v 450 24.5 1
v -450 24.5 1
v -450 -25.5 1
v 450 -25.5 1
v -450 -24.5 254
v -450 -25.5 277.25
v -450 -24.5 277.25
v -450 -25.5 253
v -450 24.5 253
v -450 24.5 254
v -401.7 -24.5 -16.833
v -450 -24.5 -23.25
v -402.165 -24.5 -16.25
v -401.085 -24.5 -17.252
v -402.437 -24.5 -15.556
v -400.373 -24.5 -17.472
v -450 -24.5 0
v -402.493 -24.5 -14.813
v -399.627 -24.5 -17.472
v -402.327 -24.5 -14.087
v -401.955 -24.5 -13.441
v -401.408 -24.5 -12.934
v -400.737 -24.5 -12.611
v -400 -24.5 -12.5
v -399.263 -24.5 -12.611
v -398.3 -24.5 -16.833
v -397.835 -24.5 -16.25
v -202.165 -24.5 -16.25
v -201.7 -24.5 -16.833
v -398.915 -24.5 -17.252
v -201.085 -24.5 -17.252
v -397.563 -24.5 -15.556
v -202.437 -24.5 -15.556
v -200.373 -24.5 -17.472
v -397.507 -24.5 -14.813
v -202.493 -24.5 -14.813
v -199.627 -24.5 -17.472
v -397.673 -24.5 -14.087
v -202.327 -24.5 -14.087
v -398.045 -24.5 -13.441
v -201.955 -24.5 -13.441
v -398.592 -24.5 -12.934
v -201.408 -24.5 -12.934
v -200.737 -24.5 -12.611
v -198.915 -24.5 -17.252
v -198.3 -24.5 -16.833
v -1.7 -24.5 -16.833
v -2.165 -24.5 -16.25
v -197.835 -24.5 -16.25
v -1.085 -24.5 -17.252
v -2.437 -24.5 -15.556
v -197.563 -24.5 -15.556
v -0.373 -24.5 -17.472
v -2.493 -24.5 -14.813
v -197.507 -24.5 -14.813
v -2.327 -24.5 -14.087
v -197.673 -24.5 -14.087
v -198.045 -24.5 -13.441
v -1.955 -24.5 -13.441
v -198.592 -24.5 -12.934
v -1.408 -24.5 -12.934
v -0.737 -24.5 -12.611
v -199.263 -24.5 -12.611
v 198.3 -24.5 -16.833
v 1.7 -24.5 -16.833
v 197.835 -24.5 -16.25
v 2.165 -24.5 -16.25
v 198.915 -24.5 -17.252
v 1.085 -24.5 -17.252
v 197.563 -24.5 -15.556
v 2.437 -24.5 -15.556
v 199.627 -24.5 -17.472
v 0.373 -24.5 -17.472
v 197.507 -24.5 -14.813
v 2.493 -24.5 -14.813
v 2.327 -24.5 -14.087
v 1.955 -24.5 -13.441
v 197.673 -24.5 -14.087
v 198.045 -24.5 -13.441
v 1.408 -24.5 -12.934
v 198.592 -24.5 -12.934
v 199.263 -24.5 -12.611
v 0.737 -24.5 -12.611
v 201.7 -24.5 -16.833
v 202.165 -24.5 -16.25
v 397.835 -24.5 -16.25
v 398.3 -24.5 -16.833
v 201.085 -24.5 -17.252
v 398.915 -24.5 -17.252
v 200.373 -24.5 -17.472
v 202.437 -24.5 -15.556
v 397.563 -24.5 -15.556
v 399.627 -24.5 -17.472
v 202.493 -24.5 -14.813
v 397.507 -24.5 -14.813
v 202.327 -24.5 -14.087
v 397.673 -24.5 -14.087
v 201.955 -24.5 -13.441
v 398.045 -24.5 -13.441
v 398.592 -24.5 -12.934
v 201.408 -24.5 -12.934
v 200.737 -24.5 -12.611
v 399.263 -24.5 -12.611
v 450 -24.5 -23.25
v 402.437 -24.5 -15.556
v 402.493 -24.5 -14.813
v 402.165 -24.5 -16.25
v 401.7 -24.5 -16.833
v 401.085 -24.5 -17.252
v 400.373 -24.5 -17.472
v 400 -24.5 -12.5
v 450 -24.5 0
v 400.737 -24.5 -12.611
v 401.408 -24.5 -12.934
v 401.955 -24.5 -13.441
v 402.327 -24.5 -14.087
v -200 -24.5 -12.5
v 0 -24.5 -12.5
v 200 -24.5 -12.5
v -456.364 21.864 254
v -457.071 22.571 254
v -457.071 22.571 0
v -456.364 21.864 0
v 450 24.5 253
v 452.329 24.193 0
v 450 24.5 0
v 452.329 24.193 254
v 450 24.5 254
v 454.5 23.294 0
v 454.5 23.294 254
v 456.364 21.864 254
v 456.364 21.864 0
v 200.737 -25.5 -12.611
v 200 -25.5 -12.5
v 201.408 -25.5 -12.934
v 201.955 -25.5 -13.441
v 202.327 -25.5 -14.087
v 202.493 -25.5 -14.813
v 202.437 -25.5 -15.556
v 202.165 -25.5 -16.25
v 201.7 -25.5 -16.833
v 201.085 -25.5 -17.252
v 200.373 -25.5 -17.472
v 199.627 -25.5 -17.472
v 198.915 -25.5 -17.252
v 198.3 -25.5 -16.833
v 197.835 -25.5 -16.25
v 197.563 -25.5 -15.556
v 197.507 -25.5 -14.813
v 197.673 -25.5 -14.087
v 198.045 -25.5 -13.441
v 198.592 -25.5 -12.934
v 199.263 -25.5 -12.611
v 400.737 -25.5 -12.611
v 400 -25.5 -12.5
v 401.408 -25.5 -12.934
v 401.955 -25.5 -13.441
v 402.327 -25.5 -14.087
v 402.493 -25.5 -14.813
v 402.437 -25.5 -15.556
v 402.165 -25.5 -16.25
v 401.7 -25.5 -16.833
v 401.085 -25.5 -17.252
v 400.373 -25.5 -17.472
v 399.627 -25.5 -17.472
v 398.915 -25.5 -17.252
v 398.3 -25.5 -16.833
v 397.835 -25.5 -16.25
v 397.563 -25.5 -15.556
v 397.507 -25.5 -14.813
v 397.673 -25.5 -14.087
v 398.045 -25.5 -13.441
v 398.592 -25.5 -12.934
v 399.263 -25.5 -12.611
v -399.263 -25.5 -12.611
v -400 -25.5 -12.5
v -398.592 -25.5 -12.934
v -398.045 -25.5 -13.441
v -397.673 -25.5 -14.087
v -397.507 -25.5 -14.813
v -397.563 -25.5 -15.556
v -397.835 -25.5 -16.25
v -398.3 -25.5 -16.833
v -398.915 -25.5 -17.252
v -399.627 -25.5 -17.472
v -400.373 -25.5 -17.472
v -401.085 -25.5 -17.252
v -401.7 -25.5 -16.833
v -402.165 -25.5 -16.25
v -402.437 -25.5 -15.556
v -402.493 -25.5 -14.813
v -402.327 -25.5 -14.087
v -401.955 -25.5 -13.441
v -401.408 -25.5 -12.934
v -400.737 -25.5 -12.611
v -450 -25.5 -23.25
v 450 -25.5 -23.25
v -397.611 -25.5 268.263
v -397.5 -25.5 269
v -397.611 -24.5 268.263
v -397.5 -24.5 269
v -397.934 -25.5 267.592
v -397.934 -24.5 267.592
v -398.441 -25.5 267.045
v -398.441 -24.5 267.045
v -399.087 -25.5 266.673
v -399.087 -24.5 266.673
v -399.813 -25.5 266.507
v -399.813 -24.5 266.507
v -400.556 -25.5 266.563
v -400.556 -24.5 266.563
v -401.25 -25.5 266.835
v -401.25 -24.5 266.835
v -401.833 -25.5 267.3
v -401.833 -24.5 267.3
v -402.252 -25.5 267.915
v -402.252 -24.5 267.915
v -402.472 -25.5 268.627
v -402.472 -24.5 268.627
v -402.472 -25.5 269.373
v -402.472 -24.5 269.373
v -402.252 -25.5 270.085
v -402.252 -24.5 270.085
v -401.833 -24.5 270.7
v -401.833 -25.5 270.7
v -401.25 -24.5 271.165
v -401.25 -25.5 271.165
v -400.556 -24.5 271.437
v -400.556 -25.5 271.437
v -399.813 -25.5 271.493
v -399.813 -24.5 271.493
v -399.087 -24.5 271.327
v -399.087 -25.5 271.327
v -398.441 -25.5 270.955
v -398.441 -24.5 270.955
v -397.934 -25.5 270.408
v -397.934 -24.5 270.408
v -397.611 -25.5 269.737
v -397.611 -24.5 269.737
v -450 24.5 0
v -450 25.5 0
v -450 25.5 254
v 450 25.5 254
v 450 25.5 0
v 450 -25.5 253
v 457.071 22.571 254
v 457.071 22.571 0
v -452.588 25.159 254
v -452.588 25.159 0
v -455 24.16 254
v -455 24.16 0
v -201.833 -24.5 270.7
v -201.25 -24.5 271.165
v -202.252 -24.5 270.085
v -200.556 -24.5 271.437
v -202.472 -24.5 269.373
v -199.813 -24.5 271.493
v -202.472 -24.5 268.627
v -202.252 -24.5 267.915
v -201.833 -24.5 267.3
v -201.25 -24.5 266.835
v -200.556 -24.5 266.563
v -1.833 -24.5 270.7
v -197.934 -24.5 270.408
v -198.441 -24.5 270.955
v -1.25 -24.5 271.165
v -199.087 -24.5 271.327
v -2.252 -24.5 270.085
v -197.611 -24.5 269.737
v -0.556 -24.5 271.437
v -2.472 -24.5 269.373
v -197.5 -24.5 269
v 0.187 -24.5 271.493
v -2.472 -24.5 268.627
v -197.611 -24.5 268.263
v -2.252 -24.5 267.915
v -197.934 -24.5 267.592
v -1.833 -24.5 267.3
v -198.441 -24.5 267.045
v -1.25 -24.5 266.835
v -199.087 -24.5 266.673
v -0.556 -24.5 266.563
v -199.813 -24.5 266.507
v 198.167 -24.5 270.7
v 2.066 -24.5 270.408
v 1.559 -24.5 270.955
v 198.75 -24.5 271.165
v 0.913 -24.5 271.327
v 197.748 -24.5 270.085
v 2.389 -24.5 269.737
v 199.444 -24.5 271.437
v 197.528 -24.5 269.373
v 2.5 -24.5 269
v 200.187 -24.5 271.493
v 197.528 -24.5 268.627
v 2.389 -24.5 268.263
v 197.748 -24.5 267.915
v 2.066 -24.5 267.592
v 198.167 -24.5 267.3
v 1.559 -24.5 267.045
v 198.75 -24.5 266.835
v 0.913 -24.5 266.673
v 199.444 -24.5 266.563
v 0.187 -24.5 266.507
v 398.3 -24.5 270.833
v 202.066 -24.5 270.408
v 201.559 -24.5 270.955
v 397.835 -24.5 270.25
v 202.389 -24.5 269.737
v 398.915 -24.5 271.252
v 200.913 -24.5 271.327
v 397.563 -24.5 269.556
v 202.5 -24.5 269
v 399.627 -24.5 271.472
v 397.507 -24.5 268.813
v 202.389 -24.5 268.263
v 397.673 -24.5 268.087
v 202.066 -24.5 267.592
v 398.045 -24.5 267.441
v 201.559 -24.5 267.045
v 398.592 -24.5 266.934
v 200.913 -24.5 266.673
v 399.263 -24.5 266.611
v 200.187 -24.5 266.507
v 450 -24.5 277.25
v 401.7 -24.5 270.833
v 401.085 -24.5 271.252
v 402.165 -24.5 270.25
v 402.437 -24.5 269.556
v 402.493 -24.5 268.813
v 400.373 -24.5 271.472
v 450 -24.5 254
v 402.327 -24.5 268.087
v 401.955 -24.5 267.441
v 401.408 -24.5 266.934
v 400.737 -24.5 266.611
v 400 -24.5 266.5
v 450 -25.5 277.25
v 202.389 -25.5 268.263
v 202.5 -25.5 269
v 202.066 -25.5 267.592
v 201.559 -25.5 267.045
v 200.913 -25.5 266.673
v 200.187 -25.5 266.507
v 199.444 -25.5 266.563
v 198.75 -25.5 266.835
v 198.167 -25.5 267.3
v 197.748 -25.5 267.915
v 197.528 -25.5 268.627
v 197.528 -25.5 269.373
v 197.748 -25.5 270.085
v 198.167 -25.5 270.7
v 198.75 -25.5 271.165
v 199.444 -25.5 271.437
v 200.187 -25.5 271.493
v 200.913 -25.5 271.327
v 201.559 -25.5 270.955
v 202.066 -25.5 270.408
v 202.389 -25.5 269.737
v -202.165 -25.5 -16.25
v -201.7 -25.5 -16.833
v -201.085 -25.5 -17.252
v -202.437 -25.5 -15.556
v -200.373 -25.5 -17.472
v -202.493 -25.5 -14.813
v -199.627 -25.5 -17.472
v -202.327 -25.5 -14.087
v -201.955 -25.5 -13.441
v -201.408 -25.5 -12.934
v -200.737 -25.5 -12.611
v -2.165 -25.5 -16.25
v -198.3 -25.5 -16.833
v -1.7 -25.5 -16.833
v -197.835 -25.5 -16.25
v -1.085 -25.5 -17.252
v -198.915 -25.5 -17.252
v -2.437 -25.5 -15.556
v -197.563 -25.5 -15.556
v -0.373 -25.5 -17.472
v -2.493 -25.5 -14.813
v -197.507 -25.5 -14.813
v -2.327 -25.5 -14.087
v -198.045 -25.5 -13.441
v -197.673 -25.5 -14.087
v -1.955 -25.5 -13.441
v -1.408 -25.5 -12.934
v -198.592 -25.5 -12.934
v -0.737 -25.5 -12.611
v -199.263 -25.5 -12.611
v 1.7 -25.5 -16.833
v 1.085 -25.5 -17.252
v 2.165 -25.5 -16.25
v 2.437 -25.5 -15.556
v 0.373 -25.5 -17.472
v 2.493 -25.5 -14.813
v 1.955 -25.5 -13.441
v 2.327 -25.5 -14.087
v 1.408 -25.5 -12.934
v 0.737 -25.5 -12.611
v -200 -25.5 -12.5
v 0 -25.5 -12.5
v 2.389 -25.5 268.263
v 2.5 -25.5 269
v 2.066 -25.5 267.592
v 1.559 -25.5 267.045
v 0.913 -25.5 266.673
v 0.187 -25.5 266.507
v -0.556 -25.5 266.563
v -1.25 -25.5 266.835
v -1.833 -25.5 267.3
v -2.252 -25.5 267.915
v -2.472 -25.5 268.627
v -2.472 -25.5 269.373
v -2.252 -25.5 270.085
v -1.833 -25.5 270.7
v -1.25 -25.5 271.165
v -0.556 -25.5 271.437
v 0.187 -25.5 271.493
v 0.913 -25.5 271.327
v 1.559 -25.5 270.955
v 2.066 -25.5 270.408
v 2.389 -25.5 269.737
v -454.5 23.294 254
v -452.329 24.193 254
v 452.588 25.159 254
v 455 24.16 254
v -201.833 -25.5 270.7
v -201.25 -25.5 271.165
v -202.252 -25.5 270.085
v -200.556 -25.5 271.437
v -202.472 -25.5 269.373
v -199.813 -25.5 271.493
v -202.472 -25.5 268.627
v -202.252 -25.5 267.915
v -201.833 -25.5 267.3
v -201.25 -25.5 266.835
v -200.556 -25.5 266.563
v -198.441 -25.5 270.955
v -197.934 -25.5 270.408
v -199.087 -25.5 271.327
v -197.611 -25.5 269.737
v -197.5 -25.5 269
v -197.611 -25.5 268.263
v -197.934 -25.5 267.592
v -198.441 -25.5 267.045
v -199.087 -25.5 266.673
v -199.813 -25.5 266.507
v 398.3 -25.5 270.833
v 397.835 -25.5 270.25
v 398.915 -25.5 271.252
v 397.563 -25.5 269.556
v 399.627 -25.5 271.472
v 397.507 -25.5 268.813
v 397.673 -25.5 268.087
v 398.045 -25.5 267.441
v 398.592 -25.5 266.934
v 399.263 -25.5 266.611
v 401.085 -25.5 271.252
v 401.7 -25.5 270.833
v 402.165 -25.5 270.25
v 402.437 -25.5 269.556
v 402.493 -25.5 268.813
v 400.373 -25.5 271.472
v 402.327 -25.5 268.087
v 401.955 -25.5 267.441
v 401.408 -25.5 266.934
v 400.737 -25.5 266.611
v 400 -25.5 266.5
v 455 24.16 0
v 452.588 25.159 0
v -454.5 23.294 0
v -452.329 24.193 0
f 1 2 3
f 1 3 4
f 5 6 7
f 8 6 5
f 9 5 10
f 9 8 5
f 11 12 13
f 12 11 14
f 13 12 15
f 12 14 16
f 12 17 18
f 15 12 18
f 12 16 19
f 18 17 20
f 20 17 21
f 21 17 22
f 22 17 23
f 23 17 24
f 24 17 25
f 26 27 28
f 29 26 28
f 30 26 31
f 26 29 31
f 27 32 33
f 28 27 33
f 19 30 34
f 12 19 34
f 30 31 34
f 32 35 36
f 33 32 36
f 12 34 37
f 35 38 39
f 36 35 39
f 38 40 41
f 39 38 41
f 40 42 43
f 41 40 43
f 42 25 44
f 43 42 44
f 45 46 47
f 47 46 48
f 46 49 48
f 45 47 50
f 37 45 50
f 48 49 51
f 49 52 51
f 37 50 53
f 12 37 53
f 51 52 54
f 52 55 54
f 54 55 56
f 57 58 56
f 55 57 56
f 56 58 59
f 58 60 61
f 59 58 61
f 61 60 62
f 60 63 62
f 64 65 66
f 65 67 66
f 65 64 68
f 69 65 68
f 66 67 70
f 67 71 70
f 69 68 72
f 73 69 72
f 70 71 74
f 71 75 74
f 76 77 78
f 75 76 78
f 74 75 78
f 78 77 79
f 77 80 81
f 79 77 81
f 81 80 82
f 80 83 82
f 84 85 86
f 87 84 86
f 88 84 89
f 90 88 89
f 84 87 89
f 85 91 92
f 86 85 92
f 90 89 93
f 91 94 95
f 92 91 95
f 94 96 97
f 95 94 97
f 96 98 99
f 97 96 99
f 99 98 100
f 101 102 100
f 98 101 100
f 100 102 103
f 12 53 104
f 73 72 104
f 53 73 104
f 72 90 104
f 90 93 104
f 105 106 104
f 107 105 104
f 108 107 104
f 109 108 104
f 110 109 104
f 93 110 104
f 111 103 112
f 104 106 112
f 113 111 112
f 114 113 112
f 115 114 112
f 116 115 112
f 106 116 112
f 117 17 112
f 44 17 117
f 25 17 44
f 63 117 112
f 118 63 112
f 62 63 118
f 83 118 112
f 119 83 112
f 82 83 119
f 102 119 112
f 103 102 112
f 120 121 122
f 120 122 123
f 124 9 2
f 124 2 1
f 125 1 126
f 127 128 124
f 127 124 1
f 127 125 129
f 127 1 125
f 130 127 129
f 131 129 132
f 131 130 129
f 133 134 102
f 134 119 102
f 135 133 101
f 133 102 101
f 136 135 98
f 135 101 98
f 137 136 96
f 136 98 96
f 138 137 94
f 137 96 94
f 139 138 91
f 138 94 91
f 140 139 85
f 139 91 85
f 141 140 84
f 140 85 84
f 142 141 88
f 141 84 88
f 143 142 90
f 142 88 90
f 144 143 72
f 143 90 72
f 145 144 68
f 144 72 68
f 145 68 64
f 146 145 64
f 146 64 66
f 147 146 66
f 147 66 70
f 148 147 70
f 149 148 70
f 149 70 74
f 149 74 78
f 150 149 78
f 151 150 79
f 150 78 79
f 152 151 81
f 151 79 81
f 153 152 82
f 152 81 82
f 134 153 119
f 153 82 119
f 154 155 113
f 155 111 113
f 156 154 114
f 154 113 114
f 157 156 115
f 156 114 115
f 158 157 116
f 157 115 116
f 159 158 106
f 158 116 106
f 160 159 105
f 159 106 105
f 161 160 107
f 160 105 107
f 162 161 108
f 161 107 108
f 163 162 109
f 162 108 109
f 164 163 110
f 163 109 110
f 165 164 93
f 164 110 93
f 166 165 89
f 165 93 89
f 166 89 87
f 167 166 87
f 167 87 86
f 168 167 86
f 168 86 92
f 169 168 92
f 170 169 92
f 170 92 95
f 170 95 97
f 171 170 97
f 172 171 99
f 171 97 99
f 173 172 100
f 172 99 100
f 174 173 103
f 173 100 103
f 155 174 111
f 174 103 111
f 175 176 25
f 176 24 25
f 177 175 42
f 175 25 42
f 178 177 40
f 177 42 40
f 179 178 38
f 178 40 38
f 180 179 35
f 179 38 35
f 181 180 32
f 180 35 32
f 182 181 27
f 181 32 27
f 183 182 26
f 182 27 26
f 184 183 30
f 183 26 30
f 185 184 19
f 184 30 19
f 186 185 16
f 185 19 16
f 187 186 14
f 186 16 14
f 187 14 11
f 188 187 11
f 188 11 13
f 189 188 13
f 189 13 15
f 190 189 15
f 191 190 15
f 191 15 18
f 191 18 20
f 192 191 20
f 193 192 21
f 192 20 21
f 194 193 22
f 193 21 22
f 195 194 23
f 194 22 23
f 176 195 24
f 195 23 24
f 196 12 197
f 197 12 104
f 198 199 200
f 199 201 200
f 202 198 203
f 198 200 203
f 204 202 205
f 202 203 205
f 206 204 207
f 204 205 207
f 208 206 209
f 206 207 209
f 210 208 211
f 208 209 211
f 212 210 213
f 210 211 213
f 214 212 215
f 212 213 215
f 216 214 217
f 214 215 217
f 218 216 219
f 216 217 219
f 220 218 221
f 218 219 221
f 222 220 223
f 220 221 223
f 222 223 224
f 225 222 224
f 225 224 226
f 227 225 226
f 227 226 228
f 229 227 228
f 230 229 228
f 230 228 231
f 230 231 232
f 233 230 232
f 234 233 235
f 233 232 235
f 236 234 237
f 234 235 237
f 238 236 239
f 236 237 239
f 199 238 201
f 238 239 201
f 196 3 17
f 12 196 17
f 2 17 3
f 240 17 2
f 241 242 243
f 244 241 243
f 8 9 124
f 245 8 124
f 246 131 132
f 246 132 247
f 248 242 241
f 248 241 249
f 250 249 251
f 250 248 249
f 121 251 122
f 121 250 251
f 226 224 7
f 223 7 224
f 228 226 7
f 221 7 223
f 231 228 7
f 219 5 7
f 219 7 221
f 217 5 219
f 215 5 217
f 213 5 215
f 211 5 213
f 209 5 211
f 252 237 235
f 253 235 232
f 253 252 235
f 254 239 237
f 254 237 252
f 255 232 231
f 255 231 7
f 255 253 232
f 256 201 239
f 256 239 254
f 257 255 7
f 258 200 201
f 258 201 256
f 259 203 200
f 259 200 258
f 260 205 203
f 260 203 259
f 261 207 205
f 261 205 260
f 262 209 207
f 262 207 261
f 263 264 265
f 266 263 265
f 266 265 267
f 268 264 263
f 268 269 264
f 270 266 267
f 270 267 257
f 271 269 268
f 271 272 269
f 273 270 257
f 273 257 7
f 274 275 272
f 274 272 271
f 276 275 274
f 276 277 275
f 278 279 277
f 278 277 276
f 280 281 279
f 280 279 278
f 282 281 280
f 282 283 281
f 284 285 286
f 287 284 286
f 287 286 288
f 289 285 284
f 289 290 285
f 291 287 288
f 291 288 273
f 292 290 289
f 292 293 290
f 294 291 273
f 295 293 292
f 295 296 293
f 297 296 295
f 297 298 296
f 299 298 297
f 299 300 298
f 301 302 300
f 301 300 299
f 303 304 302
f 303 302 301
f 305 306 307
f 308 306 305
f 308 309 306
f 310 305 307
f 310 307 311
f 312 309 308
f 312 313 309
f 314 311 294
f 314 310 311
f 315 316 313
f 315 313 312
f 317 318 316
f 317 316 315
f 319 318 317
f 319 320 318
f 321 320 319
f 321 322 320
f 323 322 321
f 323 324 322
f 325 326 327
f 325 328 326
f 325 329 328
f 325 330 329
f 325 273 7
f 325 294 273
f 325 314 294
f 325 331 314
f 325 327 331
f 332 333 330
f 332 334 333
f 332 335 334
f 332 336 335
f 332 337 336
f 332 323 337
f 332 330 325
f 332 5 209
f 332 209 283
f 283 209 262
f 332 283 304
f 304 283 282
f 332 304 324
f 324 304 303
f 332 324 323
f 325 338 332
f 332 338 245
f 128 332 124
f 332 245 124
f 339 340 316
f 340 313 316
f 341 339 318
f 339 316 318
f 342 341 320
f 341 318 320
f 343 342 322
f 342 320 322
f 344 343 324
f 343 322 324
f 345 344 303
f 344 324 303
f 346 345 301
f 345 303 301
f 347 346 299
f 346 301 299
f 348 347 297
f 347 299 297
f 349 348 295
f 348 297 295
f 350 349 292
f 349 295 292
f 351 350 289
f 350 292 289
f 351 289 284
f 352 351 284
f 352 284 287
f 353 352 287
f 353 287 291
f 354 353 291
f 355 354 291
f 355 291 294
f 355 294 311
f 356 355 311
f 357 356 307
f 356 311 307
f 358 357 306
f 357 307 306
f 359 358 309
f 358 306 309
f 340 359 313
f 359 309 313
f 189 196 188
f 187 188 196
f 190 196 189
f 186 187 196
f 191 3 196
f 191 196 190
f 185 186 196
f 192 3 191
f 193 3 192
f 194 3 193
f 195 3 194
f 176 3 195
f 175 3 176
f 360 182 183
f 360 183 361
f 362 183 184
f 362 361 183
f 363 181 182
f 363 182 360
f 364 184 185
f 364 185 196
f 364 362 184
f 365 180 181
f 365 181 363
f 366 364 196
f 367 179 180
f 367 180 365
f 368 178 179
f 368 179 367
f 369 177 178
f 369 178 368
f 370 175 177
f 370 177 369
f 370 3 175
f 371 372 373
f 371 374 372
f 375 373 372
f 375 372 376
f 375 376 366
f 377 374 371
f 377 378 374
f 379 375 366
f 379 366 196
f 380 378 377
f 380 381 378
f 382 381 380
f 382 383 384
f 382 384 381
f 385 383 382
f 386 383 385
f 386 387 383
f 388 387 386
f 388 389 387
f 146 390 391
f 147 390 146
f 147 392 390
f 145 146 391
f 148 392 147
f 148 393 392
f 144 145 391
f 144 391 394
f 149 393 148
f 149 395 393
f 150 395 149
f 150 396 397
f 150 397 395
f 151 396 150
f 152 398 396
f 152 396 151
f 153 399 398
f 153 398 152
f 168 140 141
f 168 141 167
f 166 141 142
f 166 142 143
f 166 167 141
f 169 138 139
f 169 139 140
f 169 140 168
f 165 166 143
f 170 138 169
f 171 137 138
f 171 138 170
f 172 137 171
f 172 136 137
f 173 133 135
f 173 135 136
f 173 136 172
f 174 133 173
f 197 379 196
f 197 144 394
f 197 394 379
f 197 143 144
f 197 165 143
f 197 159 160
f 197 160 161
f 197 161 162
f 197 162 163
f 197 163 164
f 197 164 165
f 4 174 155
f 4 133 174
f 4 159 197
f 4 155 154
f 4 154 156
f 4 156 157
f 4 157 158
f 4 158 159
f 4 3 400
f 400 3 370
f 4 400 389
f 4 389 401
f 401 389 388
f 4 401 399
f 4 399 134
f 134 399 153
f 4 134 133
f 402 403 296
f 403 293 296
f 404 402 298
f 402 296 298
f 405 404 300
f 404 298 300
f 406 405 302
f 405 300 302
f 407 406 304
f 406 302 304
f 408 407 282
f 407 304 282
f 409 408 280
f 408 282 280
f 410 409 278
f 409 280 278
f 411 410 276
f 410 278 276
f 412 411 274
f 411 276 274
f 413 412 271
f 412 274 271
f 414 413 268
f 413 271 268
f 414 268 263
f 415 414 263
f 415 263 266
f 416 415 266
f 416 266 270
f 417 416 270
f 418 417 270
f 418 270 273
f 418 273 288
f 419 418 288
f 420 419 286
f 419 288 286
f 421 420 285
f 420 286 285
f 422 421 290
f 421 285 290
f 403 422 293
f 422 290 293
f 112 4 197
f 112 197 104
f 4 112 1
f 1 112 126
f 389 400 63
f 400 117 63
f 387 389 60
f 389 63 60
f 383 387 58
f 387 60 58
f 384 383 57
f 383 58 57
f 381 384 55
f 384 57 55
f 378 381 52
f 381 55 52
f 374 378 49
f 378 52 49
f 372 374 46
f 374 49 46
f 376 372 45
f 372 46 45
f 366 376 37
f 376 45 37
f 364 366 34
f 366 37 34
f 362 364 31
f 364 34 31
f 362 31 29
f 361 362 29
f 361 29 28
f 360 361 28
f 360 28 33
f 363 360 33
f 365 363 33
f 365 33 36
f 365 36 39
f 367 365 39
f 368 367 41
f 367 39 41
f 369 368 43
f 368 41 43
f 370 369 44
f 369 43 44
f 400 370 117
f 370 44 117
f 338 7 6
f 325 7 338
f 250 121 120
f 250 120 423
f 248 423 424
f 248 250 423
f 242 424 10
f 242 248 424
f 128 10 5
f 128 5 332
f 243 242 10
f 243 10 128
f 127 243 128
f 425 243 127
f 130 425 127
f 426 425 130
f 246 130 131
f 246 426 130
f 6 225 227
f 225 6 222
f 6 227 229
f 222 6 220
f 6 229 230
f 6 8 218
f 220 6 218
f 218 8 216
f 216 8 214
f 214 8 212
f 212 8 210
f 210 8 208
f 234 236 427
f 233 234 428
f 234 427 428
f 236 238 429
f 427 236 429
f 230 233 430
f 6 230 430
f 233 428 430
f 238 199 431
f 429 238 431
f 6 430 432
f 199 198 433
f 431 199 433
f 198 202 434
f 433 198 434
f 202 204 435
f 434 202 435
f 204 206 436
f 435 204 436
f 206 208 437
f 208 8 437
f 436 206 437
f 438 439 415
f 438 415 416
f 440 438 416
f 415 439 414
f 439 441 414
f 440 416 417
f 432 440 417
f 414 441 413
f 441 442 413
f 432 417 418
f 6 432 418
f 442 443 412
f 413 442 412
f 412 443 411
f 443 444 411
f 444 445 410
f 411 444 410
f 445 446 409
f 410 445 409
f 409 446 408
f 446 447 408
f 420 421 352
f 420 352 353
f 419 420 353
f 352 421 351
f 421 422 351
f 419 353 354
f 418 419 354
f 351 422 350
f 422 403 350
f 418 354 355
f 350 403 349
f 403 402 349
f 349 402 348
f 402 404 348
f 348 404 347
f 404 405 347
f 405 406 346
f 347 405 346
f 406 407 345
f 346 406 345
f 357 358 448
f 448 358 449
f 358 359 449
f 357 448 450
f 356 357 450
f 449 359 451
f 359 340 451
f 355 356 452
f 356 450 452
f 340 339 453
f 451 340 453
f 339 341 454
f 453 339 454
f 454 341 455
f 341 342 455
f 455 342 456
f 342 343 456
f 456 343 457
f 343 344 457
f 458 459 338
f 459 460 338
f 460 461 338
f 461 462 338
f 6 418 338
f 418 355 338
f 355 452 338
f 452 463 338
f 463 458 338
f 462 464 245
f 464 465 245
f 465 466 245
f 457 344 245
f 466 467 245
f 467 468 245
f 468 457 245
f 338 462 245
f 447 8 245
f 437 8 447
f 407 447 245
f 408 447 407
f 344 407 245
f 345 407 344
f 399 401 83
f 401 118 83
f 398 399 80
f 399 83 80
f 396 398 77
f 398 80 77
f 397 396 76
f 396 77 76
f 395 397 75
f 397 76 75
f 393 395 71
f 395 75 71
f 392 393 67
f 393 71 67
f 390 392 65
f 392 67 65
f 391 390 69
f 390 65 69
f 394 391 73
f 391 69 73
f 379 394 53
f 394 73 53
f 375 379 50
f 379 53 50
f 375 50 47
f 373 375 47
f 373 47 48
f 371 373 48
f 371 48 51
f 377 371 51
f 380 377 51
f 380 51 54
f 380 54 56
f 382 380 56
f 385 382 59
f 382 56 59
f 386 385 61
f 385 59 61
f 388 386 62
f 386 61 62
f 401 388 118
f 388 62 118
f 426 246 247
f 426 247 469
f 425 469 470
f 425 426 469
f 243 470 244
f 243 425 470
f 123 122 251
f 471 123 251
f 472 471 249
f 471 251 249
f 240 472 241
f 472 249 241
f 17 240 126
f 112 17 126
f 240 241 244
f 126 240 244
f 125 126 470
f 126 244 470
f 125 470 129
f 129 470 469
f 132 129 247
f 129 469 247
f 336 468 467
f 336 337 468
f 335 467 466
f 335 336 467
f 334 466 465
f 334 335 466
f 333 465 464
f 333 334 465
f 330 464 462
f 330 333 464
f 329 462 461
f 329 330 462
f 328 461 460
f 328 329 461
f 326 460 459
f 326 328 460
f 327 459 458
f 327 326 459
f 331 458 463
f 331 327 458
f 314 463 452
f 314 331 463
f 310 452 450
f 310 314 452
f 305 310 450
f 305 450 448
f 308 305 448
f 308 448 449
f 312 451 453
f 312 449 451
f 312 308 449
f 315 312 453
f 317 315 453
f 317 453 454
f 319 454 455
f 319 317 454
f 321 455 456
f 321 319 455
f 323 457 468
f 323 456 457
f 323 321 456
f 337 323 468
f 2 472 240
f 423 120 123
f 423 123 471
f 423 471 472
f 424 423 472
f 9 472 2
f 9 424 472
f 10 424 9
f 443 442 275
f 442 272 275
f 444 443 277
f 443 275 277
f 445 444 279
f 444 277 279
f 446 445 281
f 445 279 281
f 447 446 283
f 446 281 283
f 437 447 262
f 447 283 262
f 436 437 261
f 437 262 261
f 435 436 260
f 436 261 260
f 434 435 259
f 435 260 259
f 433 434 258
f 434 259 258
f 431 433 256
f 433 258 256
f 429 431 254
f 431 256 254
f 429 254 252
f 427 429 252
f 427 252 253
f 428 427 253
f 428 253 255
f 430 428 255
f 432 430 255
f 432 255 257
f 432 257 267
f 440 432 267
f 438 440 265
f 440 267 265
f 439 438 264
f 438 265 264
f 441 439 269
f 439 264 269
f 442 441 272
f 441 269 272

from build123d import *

# Parameters (mm, degrees)
SKETCH2_W               = 900
SKETCH2_H               = 51
BOSS_EXTRUDE1_DEPTH     = 1
SKETCH3_W               = 900
SKETCH3_H               = 1
BOSS_EXTRUDE2_DEPTH     = 23.25
BOSS_EXTRUDE3_START     = 1
SKETCH4_W               = 900
SKETCH4_H               = 1
BOSS_EXTRUDE3_DEPTH     = 126
SKETCH5_R               = 2.5
CUT_EXTRUDE1_DEPTH      = 469.272623586
LPATTERN2_COUNT         = 6
LPATTERN2_PITCH         = 200
BOSS_EXTRUDE4_DEPTH     = 127
BOSS_EXTRUDE5_DEPTH     = 127
MIRROR4_COPY_1_SKETCH_R = 2.5
MIRROR4_COPY_1_DEPTH    = 469.272623586
MIRROR4_COPY_2_SKETCH_R = 2.5
MIRROR4_COPY_2_DEPTH    = 469.272623586
MIRROR4_COPY_3_SKETCH_R = 2.5
MIRROR4_COPY_3_DEPTH    = 469.272623586
MIRROR4_COPY_4_SKETCH_R = 2.5
MIRROR4_COPY_4_DEPTH    = 469.272623586
MIRROR4_COPY_5_SKETCH_R = 2.5
MIRROR4_COPY_5_DEPTH    = 469.272623586


with BuildPart() as part:
    # Sketch2 → Boss-Extrude1 (new body)
    with BuildSketch(Plane.XY):
        Rectangle(SKETCH2_W, SKETCH2_H)
    boss_extrude1 = extrude(amount=BOSS_EXTRUDE1_DEPTH)

    # Sketch3 → Boss-Extrude2 (add)
    with BuildSketch(Plane.XY):
        with Locations((0, -25)):
            Rectangle(SKETCH3_W, SKETCH3_H)
    boss_extrude2 = extrude(amount=-BOSS_EXTRUDE2_DEPTH)

    # Sketch4 → Boss-Extrude3 (add)
    with BuildSketch(Plane.XY.offset(BOSS_EXTRUDE3_START)):
        with Locations((0, 25)):
            Rectangle(SKETCH4_W, SKETCH4_H)
    boss_extrude3 = extrude(amount=BOSS_EXTRUDE3_DEPTH)

    # Sketch5 → Cut-Extrude1 (cut, symmetric)
    with BuildSketch(Plane(origin=(0, 0, 0), x_dir=(1, 0, 0), z_dir=(0, 1, 0))):
        with Locations(Location((400, 15, 0), (0, 0, 270))):
            Circle(SKETCH5_R)
    cut_extrude1 = extrude(amount=CUT_EXTRUDE1_DEPTH, both=True, mode=Mode.SUBTRACT)

    # LPattern2: Cut-Extrude1 ×6
    with Locations(*[(-i * LPATTERN2_PITCH, 0, 0) for i in range(1, LPATTERN2_COUNT)]):
        add(cut_extrude1, mode=Mode.SUBTRACT)

    # Sketch7 → Boss-Extrude4 (add)
    with BuildSketch(Plane.XY):
        with BuildLine():
            Line((-450, 24.5), (-450, 25.5))
            ThreePointArc((-450, 25.5), (-453.826834324, 24.738795325), (-457.071067812, 22.571067812))
            Line((-457.071067812, 22.571067812), (-456.363961031, 21.863961031))
            ThreePointArc((-456.363961031, 21.863961031), (-453.444150891, 23.814915793), (-450, 24.5))
        make_face()
    boss_extrude4 = extrude(amount=BOSS_EXTRUDE4_DEPTH)

    # Sketch8 → Boss-Extrude5 (add)
    with BuildSketch(Plane.XY):
        with BuildLine():
            Line((456.363961031, 21.863961031), (457.071067812, 22.571067812))
            ThreePointArc((457.071067812, 22.571067812), (453.826834324, 24.738795325), (450, 25.5))
            Line((450, 25.5), (450, 24.5))
            ThreePointArc((450, 24.5), (453.444150891, 23.814915793), (456.363961031, 21.863961031))
        make_face()
    boss_extrude5 = extrude(amount=BOSS_EXTRUDE5_DEPTH)

    # Mirror2: Boss-Extrude3, Boss-Extrude4, Boss-Extrude5 across plane
    add(boss_extrude3.mirror(Plane.XY.offset(127)))
    add(boss_extrude4.mirror(Plane.XY.offset(127)))
    add(boss_extrude5.mirror(Plane.XY.offset(127)))

    # Mirror4: Boss-Extrude1, Boss-Extrude2, Cut-Extrude1 across plane
    add(boss_extrude1.mirror(Plane.XY.offset(127)))
    add(boss_extrude2.mirror(Plane.XY.offset(127)))
    add(cut_extrude1.mirror(Plane.XY.offset(127)), mode=Mode.SUBTRACT)

    # Mirror4 copy 1 sketch → Mirror4 copy 1 (cut, symmetric)
    with BuildSketch(Plane(origin=(-200, 0, 254), x_dir=(1, 0, 0), z_dir=(0, 1, 0))):
        with Locations((400, -15)):
            Circle(MIRROR4_COPY_1_SKETCH_R)
    extrude(amount=MIRROR4_COPY_1_DEPTH, both=True, mode=Mode.SUBTRACT)

    # Mirror4 copy 2 sketch → Mirror4 copy 2 (cut, symmetric)
    with BuildSketch(Plane(origin=(-400, 0, 254), x_dir=(1, 0, 0), z_dir=(0, 1, 0))):
        with Locations((400, -15)):
            Circle(MIRROR4_COPY_2_SKETCH_R)
    extrude(amount=MIRROR4_COPY_2_DEPTH, both=True, mode=Mode.SUBTRACT)

    # Mirror4 copy 3 sketch → Mirror4 copy 3 (cut, symmetric)
    with BuildSketch(Plane(origin=(-600, 0, 254), x_dir=(1, 0, 0), z_dir=(0, 1, 0))):
        with Locations((400, -15)):
            Circle(MIRROR4_COPY_3_SKETCH_R)
    extrude(amount=MIRROR4_COPY_3_DEPTH, both=True, mode=Mode.SUBTRACT)

    # Mirror4 copy 4 sketch → Mirror4 copy 4 (cut, symmetric)
    with BuildSketch(Plane(origin=(-800, 0, 254), x_dir=(1, 0, 0), z_dir=(0, 1, 0))):
        with Locations((400, -15)):
            Circle(MIRROR4_COPY_4_SKETCH_R)
    extrude(amount=MIRROR4_COPY_4_DEPTH, both=True, mode=Mode.SUBTRACT)

    # Mirror4 copy 5 sketch → Mirror4 copy 5 (cut, symmetric)
    with BuildSketch(Plane(origin=(-1000, 0, 254), x_dir=(1, 0, 0), z_dir=(0, 1, 0))):
        with Locations((400, -15)):
            Circle(MIRROR4_COPY_5_SKETCH_R)
    extrude(amount=MIRROR4_COPY_5_DEPTH, both=True, mode=Mode.SUBTRACT)


solid = part.part
